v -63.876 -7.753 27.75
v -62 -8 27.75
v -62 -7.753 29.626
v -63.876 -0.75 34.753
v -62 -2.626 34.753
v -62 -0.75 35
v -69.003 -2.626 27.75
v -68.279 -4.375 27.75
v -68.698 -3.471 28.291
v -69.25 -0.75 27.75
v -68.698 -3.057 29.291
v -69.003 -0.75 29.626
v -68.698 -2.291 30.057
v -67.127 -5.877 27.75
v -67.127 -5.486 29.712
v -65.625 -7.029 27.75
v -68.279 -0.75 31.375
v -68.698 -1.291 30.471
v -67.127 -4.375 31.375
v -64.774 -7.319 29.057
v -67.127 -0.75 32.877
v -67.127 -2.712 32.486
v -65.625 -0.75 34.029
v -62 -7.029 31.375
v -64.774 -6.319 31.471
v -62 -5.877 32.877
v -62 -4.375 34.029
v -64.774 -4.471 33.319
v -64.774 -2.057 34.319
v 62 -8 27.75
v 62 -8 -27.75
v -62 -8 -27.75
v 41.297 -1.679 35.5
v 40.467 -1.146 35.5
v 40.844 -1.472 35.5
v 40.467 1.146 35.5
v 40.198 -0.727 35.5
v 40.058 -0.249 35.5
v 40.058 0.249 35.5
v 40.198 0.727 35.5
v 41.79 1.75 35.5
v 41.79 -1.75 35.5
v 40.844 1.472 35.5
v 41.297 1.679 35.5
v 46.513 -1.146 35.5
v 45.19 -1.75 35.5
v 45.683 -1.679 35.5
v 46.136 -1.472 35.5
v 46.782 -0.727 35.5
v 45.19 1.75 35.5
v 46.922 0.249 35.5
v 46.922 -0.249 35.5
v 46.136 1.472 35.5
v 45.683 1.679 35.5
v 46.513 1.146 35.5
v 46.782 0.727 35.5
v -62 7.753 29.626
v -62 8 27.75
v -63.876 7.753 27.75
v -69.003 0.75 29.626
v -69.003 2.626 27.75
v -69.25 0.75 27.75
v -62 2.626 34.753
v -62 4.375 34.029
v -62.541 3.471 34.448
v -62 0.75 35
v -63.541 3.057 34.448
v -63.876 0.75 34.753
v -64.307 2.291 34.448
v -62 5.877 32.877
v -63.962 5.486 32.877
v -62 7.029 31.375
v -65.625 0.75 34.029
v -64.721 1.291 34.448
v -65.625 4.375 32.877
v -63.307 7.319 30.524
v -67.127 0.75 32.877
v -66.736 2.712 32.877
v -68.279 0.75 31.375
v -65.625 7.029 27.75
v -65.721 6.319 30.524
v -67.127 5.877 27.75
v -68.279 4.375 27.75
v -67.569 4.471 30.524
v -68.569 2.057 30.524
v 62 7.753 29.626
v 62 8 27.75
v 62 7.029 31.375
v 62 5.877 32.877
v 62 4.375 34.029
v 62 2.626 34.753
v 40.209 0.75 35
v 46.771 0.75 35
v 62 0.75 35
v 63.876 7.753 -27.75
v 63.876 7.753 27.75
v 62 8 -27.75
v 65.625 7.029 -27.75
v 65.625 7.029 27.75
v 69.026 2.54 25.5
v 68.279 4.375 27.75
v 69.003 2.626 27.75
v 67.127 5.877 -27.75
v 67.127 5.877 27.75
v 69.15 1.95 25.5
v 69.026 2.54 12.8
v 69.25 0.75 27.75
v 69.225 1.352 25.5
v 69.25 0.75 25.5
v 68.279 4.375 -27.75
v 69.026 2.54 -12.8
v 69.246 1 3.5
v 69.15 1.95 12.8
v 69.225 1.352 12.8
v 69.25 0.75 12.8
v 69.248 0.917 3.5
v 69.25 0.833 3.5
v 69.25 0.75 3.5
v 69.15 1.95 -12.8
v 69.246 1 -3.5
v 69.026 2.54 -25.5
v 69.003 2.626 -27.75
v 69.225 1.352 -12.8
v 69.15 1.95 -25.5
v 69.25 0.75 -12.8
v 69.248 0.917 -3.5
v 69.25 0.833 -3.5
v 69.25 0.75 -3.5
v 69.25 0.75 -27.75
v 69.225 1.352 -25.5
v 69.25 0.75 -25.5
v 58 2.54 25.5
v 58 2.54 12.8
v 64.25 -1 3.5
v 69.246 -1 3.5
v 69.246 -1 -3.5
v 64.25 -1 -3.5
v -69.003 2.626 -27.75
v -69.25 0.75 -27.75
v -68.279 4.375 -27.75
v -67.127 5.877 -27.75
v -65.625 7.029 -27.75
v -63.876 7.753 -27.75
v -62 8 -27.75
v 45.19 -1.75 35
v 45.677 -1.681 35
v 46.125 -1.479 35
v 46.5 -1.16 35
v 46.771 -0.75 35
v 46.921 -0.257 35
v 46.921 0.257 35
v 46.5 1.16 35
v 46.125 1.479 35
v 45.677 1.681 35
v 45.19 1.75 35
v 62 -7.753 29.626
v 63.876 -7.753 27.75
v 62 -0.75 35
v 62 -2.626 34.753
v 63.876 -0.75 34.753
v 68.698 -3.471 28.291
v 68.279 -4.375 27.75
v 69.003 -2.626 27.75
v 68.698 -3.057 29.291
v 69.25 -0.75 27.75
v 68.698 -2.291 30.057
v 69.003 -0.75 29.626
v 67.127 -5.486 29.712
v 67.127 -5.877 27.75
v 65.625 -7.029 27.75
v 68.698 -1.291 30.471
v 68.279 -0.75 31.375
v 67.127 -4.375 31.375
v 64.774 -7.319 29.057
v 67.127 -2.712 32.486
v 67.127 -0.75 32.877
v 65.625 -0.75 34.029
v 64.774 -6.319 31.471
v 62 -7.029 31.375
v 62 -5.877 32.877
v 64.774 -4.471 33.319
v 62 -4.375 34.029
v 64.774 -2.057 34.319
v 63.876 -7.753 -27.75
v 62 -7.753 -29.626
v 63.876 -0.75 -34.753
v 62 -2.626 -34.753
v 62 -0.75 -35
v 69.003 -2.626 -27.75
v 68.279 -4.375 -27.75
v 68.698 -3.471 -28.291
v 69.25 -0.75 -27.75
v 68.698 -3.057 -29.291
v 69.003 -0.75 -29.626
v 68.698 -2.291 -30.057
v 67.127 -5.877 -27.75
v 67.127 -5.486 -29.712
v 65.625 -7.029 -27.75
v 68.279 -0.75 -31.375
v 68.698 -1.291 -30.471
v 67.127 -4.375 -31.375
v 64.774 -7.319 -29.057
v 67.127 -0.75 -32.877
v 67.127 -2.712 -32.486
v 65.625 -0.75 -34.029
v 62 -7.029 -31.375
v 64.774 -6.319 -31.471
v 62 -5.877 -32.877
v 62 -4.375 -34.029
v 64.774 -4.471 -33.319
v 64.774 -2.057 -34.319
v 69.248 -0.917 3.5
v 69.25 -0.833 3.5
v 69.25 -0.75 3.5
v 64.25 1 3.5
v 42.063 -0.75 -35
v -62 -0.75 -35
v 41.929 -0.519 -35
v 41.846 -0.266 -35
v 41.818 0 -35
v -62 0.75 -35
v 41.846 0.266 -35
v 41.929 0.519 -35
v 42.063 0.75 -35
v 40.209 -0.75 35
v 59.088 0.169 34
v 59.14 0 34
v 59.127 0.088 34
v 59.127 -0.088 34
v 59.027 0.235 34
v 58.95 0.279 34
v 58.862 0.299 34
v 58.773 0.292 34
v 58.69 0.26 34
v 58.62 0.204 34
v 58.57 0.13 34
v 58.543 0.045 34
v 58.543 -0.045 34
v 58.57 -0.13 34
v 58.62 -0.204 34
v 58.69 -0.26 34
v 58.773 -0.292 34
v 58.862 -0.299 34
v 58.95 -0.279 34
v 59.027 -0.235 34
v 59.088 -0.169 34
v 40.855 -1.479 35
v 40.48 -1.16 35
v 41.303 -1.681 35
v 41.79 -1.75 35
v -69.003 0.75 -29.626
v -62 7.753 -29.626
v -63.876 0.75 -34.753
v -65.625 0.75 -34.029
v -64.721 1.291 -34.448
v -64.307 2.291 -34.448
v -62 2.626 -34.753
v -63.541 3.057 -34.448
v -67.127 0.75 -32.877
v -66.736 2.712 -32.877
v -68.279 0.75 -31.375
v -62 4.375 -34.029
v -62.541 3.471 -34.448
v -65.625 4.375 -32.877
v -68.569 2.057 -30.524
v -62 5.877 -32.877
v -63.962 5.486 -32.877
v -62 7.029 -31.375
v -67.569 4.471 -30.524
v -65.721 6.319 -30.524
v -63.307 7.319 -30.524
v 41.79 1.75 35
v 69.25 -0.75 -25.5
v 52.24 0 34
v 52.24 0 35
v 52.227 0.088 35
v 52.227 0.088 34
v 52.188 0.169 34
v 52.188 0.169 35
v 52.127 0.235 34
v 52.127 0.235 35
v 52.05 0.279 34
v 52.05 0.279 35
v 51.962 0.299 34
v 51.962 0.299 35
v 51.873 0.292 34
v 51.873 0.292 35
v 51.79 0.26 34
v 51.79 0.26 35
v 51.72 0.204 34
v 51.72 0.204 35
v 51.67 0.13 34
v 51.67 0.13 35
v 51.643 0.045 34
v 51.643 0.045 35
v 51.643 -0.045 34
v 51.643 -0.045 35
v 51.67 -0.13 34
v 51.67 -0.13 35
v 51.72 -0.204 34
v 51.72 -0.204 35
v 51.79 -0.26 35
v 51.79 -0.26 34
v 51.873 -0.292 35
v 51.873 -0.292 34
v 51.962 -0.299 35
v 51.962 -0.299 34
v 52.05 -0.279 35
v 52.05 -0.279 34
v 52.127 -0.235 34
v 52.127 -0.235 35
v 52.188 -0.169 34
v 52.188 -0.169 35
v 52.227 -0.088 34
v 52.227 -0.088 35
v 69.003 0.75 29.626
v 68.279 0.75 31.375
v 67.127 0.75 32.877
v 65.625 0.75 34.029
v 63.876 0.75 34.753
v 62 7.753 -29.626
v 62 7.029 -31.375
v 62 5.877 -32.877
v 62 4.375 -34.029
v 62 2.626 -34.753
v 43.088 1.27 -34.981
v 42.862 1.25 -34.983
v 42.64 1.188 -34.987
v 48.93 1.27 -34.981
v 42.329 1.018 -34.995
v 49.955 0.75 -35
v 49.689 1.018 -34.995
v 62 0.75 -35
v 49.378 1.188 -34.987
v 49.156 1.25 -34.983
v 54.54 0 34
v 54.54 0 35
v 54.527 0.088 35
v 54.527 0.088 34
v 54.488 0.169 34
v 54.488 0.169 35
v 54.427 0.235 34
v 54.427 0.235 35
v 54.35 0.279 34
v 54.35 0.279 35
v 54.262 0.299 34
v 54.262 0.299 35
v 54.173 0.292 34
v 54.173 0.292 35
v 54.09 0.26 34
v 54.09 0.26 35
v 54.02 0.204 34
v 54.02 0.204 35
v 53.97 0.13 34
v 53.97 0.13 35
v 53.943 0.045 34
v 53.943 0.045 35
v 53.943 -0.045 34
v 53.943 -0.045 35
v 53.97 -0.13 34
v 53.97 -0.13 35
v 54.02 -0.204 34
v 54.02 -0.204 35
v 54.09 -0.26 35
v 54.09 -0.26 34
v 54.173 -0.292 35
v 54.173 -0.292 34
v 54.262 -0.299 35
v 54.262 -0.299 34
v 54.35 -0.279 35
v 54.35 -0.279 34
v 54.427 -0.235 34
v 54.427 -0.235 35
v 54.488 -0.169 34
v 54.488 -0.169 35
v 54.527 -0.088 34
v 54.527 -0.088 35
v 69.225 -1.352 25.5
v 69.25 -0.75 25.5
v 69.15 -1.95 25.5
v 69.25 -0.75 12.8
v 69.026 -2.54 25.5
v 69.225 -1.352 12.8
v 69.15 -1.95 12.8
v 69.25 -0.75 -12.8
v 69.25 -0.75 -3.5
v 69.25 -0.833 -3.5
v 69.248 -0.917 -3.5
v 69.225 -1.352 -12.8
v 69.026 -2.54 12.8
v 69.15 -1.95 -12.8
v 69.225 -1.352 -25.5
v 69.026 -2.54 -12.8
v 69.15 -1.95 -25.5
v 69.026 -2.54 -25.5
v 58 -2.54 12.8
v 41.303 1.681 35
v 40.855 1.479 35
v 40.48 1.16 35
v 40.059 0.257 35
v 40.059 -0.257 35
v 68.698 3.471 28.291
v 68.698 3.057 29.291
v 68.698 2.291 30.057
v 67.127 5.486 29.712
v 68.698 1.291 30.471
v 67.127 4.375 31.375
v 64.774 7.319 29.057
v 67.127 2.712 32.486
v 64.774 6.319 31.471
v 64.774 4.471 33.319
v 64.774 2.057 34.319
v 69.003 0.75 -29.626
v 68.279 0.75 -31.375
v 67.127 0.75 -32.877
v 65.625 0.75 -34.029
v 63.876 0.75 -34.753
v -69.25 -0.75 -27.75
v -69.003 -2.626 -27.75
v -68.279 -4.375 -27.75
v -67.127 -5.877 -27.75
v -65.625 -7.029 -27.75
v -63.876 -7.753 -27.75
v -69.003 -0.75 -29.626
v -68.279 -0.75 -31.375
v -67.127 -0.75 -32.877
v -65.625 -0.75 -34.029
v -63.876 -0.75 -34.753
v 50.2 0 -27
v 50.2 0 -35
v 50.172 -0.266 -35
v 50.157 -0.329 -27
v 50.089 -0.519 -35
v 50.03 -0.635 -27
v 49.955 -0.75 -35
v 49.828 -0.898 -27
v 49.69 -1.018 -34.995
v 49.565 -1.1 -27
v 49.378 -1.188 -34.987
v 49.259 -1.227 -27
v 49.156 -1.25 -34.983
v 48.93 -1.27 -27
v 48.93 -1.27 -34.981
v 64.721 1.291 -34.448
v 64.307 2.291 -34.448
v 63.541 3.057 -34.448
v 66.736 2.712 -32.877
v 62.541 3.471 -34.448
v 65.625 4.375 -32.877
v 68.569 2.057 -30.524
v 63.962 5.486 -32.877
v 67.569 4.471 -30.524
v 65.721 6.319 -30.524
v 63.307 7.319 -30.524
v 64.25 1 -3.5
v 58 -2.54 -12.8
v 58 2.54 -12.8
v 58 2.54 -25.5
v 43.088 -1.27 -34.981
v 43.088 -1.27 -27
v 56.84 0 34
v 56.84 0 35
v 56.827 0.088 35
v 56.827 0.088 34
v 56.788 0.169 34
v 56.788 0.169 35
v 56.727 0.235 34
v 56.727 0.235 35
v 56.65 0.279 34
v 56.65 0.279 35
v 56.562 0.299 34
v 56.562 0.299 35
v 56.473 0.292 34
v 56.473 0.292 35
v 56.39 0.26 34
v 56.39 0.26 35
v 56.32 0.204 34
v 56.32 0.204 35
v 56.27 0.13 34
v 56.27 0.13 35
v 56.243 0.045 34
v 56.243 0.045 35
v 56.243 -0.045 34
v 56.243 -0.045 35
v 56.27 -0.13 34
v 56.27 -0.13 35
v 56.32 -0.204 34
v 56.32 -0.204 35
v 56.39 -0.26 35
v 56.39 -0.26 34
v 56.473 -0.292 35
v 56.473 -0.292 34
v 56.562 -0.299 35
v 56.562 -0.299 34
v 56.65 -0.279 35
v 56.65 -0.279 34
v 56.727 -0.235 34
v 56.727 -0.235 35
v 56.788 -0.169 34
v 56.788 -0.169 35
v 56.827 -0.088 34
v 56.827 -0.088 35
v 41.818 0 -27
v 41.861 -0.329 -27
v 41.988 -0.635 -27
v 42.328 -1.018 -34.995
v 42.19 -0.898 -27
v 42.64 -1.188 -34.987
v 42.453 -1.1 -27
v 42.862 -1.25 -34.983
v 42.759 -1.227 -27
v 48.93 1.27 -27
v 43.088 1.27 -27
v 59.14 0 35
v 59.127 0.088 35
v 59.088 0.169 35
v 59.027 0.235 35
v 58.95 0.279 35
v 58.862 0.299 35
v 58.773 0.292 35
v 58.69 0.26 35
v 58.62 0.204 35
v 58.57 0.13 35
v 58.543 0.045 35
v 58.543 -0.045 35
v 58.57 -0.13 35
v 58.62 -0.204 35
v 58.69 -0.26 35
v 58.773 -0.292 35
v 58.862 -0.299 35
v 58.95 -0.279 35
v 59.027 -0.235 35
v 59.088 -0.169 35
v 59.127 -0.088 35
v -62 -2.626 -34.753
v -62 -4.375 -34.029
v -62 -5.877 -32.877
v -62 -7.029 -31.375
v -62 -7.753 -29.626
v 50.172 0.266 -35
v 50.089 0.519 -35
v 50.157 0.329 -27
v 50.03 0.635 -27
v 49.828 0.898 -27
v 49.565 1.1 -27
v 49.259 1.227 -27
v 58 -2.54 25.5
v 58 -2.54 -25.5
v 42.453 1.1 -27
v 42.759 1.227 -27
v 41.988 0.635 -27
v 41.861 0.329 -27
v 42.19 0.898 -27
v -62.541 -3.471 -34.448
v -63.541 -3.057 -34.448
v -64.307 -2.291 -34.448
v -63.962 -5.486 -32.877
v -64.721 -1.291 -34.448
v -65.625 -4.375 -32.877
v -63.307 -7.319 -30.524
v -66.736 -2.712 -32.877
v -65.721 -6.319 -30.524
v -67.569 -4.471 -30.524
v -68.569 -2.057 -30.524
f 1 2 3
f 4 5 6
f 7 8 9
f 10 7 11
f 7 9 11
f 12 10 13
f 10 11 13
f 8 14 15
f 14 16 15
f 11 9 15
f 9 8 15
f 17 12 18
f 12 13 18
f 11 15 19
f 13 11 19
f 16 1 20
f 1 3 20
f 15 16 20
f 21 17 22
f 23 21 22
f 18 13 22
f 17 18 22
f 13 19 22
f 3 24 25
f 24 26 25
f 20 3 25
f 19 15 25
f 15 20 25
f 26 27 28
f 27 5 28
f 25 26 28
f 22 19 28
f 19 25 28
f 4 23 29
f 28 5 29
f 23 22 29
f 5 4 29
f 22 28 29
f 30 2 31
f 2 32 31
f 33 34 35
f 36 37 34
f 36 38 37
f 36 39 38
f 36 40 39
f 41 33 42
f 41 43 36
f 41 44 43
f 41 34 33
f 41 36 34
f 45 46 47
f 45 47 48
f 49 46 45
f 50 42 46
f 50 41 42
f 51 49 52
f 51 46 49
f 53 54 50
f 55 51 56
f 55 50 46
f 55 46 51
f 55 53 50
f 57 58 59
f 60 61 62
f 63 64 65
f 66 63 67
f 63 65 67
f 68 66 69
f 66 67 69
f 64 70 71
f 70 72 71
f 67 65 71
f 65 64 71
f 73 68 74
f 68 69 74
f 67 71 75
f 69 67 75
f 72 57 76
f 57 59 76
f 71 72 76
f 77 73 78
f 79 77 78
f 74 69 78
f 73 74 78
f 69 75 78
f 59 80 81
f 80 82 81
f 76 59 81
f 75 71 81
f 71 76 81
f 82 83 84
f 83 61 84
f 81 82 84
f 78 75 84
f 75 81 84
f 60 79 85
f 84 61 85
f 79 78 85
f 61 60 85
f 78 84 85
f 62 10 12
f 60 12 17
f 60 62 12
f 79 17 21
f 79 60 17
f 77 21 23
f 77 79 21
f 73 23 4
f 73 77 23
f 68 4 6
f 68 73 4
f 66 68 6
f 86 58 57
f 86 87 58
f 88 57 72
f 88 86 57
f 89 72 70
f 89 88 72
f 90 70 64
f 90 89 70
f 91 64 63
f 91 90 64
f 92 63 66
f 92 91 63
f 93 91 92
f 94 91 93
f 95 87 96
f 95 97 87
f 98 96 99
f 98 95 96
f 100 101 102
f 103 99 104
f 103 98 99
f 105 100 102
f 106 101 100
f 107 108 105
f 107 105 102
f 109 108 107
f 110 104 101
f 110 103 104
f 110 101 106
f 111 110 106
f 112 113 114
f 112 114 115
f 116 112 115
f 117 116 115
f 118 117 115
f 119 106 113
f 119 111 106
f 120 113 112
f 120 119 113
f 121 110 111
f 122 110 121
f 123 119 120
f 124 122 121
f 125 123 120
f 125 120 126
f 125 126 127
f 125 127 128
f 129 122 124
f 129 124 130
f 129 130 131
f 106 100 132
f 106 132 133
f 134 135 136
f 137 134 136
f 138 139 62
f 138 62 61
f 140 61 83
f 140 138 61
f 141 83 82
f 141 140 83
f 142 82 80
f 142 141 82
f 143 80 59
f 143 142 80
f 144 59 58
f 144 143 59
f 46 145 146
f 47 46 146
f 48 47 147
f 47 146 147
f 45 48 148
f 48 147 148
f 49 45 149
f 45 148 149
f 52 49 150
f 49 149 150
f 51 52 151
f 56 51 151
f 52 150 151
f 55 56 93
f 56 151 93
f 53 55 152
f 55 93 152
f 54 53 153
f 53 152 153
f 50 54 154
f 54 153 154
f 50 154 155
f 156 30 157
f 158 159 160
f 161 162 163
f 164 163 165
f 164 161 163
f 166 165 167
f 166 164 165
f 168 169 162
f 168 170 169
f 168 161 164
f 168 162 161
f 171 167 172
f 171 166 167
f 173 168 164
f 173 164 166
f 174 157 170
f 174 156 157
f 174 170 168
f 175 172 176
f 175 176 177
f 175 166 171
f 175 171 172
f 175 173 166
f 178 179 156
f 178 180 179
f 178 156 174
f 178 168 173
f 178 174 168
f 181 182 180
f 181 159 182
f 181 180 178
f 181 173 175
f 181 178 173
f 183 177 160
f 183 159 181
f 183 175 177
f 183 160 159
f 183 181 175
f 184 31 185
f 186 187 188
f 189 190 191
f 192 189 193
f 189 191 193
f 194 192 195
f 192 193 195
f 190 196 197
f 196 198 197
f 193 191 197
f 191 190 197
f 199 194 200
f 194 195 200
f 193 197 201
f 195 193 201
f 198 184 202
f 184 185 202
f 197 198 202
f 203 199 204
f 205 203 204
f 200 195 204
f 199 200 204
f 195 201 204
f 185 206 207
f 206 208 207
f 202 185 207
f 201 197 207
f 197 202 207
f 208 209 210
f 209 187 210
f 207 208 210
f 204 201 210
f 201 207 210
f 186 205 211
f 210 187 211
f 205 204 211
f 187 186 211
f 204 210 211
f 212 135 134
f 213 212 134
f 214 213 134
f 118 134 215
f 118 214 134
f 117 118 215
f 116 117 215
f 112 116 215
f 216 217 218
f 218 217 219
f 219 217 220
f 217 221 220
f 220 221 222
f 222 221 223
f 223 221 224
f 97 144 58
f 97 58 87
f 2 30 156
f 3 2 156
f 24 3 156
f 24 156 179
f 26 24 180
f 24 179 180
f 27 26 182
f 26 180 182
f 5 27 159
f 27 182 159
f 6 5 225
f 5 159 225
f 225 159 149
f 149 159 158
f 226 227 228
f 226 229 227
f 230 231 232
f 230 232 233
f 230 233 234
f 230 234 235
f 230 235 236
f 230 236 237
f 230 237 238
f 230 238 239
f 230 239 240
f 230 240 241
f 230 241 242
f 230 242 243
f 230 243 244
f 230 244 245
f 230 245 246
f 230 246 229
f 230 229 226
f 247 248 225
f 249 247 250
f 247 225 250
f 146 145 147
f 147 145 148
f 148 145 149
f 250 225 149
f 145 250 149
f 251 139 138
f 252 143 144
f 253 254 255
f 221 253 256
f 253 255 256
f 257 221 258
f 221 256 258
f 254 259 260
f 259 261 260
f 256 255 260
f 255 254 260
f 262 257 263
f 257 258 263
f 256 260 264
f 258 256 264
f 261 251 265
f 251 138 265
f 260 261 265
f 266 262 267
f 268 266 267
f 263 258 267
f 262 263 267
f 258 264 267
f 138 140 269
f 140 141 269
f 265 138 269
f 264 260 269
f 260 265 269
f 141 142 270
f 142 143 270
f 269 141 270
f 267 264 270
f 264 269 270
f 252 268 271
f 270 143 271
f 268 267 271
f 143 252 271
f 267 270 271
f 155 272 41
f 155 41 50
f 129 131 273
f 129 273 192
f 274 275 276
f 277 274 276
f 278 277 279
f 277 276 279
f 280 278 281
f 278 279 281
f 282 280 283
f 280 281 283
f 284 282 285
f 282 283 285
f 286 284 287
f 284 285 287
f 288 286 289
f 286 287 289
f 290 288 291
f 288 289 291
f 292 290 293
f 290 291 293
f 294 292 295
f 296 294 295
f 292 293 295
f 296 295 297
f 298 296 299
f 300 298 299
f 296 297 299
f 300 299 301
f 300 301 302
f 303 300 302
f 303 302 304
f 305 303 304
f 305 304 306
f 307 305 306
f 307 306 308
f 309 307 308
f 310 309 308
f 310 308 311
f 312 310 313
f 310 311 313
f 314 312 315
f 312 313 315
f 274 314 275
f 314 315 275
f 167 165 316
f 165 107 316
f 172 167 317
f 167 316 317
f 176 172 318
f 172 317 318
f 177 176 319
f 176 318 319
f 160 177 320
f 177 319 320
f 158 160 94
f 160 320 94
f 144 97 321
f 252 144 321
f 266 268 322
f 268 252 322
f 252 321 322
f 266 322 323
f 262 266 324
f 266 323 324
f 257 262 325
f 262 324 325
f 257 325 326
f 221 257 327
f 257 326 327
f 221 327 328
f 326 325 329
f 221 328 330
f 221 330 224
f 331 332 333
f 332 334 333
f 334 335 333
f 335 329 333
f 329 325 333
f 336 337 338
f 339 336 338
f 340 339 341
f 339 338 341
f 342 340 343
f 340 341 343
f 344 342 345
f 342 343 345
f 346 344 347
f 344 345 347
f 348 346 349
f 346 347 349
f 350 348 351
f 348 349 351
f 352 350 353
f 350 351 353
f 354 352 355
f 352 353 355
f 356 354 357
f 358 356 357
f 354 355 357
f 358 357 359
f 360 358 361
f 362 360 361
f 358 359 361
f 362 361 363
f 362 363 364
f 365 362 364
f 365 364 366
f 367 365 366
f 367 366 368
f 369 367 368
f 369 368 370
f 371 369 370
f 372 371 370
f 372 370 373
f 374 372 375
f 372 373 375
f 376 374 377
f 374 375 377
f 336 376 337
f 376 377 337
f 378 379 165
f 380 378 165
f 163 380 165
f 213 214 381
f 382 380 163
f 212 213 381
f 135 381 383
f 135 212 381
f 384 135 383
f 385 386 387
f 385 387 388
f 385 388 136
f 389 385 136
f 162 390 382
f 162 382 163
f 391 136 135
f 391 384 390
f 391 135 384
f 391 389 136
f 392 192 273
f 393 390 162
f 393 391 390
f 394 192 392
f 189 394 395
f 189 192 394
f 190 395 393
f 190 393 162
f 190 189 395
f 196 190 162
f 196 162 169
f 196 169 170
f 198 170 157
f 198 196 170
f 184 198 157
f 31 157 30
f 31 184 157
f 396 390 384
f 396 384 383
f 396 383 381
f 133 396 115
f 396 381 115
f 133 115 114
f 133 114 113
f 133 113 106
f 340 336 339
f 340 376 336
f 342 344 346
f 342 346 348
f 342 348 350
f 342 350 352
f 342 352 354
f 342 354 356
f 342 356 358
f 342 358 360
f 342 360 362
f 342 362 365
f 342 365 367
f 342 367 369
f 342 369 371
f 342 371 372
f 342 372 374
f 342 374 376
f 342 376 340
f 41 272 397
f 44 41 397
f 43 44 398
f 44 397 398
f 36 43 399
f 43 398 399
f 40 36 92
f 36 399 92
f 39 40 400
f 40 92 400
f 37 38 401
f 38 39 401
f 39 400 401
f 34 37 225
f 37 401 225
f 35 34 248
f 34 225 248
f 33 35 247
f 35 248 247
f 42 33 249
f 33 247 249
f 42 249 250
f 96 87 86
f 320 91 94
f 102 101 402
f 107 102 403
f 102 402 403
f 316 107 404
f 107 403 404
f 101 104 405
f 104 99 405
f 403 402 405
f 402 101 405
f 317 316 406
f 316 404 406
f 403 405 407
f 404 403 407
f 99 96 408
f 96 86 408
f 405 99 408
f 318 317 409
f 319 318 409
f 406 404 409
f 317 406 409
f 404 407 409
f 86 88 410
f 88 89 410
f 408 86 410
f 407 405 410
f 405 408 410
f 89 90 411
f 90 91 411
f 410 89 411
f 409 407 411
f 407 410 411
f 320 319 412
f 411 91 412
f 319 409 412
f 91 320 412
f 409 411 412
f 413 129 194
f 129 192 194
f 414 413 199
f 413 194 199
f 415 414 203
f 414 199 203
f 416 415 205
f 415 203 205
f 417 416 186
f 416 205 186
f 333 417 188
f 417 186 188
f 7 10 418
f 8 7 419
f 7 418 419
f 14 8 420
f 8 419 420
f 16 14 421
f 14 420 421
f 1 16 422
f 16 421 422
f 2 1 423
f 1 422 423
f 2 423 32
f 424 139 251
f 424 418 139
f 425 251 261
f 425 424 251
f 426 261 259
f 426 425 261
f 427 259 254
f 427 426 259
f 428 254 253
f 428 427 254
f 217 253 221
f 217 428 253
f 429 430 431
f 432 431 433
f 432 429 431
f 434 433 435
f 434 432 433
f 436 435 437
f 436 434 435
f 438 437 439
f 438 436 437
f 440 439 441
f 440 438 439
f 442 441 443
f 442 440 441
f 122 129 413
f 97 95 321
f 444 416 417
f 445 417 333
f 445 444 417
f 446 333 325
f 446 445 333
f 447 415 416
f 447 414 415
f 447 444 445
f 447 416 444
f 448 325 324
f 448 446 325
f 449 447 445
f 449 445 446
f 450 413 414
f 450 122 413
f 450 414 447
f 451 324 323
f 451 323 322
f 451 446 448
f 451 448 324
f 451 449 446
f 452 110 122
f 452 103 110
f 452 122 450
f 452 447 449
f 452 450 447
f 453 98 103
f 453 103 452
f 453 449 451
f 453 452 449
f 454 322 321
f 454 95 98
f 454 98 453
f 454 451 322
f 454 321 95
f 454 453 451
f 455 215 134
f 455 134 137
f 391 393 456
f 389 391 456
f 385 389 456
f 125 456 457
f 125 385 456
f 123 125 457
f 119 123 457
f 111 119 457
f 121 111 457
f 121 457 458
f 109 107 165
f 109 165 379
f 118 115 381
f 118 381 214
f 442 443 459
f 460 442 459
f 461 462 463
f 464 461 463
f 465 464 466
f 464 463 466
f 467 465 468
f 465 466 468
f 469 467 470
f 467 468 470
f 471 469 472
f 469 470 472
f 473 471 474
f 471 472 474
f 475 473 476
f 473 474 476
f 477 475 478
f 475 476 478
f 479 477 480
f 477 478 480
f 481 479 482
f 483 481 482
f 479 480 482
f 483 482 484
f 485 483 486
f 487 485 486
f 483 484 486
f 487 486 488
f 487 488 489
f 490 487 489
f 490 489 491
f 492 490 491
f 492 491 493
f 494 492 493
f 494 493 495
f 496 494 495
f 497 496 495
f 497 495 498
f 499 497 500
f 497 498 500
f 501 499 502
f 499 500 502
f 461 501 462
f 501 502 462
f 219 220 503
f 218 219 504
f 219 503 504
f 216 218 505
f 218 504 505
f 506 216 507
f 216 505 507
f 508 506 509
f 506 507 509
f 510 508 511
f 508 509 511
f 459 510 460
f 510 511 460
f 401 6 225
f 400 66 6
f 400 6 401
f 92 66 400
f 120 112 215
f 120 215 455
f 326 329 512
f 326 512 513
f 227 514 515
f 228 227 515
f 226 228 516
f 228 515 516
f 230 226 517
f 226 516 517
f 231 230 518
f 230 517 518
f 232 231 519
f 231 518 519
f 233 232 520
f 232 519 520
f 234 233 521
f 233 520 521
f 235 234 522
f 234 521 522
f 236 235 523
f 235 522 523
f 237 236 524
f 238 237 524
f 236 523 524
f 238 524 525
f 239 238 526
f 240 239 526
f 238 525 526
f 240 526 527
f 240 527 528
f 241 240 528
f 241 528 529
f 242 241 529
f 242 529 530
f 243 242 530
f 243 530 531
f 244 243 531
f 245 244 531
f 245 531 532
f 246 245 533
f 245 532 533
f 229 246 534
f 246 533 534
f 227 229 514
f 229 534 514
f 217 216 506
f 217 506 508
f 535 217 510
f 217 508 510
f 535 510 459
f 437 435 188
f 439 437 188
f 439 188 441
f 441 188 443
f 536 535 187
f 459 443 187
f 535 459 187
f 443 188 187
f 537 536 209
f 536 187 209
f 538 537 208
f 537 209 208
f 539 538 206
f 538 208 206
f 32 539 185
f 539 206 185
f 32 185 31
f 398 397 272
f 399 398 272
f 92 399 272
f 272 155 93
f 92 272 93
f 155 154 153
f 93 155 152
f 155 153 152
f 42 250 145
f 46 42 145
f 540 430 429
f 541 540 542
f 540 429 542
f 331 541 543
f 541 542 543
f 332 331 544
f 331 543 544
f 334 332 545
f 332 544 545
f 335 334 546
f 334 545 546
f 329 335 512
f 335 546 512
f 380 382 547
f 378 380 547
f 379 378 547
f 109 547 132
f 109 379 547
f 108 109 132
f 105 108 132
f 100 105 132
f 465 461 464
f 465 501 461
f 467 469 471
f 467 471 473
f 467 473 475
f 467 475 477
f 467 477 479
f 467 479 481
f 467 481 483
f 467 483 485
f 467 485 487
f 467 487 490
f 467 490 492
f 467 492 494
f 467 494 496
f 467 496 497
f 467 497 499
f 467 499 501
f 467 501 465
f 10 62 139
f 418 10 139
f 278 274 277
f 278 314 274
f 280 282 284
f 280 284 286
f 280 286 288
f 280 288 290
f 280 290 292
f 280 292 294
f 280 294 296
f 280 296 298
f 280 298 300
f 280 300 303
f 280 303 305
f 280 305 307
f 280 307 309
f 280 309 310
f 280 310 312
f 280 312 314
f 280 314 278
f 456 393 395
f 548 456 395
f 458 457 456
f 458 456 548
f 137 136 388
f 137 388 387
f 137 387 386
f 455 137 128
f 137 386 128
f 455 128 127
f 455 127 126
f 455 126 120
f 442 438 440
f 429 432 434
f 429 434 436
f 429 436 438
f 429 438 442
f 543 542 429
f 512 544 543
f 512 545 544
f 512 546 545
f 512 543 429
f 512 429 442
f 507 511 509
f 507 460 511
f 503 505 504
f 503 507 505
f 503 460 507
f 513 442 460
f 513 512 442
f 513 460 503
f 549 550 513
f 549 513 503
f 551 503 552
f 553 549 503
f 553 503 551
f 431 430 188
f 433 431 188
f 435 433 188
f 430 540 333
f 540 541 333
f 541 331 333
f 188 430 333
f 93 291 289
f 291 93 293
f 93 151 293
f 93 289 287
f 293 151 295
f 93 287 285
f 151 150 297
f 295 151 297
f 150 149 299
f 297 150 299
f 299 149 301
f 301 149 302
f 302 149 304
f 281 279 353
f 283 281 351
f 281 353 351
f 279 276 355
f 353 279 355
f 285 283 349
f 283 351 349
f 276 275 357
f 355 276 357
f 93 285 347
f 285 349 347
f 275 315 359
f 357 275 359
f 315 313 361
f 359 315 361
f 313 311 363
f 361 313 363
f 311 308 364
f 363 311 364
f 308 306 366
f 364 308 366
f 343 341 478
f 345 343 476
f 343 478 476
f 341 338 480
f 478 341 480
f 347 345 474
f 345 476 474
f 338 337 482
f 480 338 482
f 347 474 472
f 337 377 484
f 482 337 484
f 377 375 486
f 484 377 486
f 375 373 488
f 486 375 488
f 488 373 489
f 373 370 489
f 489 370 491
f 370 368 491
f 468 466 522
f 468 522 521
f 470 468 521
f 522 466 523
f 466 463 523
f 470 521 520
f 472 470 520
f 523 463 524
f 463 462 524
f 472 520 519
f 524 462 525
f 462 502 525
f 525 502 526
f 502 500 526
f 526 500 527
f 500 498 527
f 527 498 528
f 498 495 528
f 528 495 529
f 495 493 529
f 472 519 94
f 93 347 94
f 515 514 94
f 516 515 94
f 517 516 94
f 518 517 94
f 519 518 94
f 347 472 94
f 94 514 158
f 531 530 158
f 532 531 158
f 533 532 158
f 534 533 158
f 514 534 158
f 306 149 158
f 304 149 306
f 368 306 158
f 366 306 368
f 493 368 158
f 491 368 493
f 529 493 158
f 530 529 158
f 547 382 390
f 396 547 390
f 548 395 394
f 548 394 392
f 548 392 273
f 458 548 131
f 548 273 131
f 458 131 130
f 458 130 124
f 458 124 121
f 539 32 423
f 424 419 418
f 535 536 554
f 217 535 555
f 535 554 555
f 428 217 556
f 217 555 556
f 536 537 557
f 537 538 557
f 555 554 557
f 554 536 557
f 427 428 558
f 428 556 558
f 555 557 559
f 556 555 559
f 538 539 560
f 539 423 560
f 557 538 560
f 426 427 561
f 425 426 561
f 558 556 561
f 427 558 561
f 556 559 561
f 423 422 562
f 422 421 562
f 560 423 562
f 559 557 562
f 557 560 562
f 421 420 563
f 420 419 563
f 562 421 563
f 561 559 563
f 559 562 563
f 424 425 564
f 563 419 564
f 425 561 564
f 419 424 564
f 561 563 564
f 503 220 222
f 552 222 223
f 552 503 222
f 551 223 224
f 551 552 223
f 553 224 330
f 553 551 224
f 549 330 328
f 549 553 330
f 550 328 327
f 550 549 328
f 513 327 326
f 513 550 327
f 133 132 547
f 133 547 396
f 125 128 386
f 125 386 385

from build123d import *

# Parameters (mm, degrees)
SKETCH1_W                  = 138.5
SKETCH1_H                  = 70
BOSS_EXTRUDE1_DEPTH        = 8
FILLET1_R                  = 7.25
SKETCH3_W                  = 12.7
SKETCH3_H                  = 5.08
USB_A_DEPTH                = 11.25
SKETCH4_W                  = 7
SKETCH4_H                  = 2
USB_MICRO_NOTTOSCALE_DEPTH = 5
SKETCH5_W                  = 8.382
SKETCH5_H                  = 2.54
USB_C_DEPTH                = 8
FILLET2_R                  = 1.27
SKETCH6_W                  = 6.9
SKETCH6_H                  = 3.5
BATTERY_LEVEL_DEPTH        = 0.5
FILLET3_R                  = 1.75
SKETCH7_R                  = 0.3
BATTERY_LIGHTS_DEPTH       = 1


# Some blends are built 0.0001 mm under size
with BuildPart() as part:
    # Sketch1 → Boss-Extrude1 (new, symmetric)
    with BuildSketch(Plane(origin=(0, 0, 0), x_dir=(1, 0, 0), z_dir=(0, 1, 0))):
        Rectangle(SKETCH1_W, SKETCH1_H)
    extrude(amount=BOSS_EXTRUDE1_DEPTH, both=True)

    # Fillet1
    fillet1_edges = [part.edges().sort_by_distance(p)[0] for p in [
        (-69.25, 8, 0),
        (0, 8, 35),
        (69.25, 8, 0),
        (0, -8, 35),
        (-69.25, -8, 0),
        (0, -8, -35),
        (69.25, -8, 0),
        (69.25, 0, 35),
        (-69.25, 0, 35),
        (-69.25, 0, -35),
        (69.25, 0, -35),
        (0, 8, -35),
    ]]
    fillet(fillet1_edges, radius=FILLET1_R)

    # Sketch3 → USB-A (cut)
    with BuildSketch(Plane(origin=(69.25, 0, 0), x_dir=(0, 0, -1), z_dir=(1, 0, 0))):
        with Locations((-19.15, 0)):
            Rectangle(SKETCH3_W, SKETCH3_H)
        with Locations((19.15, 0)):
            Rectangle(SKETCH3_W, SKETCH3_H)
    extrude(amount=-USB_A_DEPTH, mode=Mode.SUBTRACT)

    # Sketch4 → USB-micro-NOTtoSCALE (cut)
    with BuildSketch(Plane(origin=(69.25, 0, 0), x_dir=(0, 0, -1), z_dir=(1, 0, 0))):
        Rectangle(SKETCH4_W, SKETCH4_H)
    extrude(amount=-USB_MICRO_NOTTOSCALE_DEPTH, mode=Mode.SUBTRACT)

    # Sketch5 → USB-C (cut)
    with BuildSketch(Plane(origin=(0, 0, -35), x_dir=(-1, 0, 0), z_dir=(0, 0, -1))):
        with Locations((-46.009, 0)):
            Rectangle(SKETCH5_W, SKETCH5_H)
    extrude(amount=-USB_C_DEPTH, mode=Mode.SUBTRACT)

    # Fillet2
    fillet2_edges = [part.edges().sort_by_distance(p)[0] for p in [
        (41.818, 1.27, -30.990663839),
        (41.818, -1.27, -30.990663839),
        (50.2, -1.27, -30.990663839),
        (50.2, 1.27, -30.990663839),
    ]]
    fillet(fillet2_edges, radius=FILLET2_R - 0.0001)  # a hair under: the kernel refuses the full size

    # Sketch6 → battery level (add)
    with BuildSketch(Plane.XY.offset(35)):
        with Locations((43.49, 0)):
            Rectangle(SKETCH6_W, SKETCH6_H)
    extrude(amount=BATTERY_LEVEL_DEPTH)

    # Fillet3
    # the kernel refuses this fillet: 1.75 mm, written as the material it takes off along each edge
    with BuildSketch(Plane(origin=(40.04, -1.75, 35), x_dir=(0, 1, 0), z_dir=(0, 0, 1))) as fillet3_piece_1:
        with BuildLine():
            CenterArc((FILLET3_R, -FILLET3_R), FILLET3_R, 90, 90)
            Line((0, -FILLET3_R), (0, 0))
            Line((0, 0), (FILLET3_R, 0))
        make_face()
    extrude(amount=4.875, mode=Mode.SUBTRACT)
    with BuildSketch(Plane(origin=(40.04, 1.75, 35), x_dir=(0, -1, 0), z_dir=(0, 0, 1)), Plane(origin=(46.94, -1.75, 35), x_dir=(0, 1, 0), z_dir=(0, 0, 1)), Plane(origin=(46.94, 1.75, 35), x_dir=(-1, 0, 0), z_dir=(0, 0, 1))) as fillet3_piece_2:
        with BuildLine():
            CenterArc((FILLET3_R, FILLET3_R), FILLET3_R, 180, 90)
            Line((0, FILLET3_R), (0, 0))
            Line((0, 0), (FILLET3_R, 0))
        make_face()
    extrude(amount=4.875, mode=Mode.SUBTRACT)

    # Sketch7 → battery lights (cut)
    with BuildSketch(Plane.XY.offset(35)):
        with Locations((51.94, 0)):
            Circle(SKETCH7_R)
        with Locations((54.24, 0)):
            Circle(SKETCH7_R)
        with Locations((56.54, 0)):
            Circle(SKETCH7_R)
        with Locations((58.84, 0)):
            Circle(SKETCH7_R)
    extrude(amount=-BATTERY_LIGHTS_DEPTH, mode=Mode.SUBTRACT)


solid = part.part
